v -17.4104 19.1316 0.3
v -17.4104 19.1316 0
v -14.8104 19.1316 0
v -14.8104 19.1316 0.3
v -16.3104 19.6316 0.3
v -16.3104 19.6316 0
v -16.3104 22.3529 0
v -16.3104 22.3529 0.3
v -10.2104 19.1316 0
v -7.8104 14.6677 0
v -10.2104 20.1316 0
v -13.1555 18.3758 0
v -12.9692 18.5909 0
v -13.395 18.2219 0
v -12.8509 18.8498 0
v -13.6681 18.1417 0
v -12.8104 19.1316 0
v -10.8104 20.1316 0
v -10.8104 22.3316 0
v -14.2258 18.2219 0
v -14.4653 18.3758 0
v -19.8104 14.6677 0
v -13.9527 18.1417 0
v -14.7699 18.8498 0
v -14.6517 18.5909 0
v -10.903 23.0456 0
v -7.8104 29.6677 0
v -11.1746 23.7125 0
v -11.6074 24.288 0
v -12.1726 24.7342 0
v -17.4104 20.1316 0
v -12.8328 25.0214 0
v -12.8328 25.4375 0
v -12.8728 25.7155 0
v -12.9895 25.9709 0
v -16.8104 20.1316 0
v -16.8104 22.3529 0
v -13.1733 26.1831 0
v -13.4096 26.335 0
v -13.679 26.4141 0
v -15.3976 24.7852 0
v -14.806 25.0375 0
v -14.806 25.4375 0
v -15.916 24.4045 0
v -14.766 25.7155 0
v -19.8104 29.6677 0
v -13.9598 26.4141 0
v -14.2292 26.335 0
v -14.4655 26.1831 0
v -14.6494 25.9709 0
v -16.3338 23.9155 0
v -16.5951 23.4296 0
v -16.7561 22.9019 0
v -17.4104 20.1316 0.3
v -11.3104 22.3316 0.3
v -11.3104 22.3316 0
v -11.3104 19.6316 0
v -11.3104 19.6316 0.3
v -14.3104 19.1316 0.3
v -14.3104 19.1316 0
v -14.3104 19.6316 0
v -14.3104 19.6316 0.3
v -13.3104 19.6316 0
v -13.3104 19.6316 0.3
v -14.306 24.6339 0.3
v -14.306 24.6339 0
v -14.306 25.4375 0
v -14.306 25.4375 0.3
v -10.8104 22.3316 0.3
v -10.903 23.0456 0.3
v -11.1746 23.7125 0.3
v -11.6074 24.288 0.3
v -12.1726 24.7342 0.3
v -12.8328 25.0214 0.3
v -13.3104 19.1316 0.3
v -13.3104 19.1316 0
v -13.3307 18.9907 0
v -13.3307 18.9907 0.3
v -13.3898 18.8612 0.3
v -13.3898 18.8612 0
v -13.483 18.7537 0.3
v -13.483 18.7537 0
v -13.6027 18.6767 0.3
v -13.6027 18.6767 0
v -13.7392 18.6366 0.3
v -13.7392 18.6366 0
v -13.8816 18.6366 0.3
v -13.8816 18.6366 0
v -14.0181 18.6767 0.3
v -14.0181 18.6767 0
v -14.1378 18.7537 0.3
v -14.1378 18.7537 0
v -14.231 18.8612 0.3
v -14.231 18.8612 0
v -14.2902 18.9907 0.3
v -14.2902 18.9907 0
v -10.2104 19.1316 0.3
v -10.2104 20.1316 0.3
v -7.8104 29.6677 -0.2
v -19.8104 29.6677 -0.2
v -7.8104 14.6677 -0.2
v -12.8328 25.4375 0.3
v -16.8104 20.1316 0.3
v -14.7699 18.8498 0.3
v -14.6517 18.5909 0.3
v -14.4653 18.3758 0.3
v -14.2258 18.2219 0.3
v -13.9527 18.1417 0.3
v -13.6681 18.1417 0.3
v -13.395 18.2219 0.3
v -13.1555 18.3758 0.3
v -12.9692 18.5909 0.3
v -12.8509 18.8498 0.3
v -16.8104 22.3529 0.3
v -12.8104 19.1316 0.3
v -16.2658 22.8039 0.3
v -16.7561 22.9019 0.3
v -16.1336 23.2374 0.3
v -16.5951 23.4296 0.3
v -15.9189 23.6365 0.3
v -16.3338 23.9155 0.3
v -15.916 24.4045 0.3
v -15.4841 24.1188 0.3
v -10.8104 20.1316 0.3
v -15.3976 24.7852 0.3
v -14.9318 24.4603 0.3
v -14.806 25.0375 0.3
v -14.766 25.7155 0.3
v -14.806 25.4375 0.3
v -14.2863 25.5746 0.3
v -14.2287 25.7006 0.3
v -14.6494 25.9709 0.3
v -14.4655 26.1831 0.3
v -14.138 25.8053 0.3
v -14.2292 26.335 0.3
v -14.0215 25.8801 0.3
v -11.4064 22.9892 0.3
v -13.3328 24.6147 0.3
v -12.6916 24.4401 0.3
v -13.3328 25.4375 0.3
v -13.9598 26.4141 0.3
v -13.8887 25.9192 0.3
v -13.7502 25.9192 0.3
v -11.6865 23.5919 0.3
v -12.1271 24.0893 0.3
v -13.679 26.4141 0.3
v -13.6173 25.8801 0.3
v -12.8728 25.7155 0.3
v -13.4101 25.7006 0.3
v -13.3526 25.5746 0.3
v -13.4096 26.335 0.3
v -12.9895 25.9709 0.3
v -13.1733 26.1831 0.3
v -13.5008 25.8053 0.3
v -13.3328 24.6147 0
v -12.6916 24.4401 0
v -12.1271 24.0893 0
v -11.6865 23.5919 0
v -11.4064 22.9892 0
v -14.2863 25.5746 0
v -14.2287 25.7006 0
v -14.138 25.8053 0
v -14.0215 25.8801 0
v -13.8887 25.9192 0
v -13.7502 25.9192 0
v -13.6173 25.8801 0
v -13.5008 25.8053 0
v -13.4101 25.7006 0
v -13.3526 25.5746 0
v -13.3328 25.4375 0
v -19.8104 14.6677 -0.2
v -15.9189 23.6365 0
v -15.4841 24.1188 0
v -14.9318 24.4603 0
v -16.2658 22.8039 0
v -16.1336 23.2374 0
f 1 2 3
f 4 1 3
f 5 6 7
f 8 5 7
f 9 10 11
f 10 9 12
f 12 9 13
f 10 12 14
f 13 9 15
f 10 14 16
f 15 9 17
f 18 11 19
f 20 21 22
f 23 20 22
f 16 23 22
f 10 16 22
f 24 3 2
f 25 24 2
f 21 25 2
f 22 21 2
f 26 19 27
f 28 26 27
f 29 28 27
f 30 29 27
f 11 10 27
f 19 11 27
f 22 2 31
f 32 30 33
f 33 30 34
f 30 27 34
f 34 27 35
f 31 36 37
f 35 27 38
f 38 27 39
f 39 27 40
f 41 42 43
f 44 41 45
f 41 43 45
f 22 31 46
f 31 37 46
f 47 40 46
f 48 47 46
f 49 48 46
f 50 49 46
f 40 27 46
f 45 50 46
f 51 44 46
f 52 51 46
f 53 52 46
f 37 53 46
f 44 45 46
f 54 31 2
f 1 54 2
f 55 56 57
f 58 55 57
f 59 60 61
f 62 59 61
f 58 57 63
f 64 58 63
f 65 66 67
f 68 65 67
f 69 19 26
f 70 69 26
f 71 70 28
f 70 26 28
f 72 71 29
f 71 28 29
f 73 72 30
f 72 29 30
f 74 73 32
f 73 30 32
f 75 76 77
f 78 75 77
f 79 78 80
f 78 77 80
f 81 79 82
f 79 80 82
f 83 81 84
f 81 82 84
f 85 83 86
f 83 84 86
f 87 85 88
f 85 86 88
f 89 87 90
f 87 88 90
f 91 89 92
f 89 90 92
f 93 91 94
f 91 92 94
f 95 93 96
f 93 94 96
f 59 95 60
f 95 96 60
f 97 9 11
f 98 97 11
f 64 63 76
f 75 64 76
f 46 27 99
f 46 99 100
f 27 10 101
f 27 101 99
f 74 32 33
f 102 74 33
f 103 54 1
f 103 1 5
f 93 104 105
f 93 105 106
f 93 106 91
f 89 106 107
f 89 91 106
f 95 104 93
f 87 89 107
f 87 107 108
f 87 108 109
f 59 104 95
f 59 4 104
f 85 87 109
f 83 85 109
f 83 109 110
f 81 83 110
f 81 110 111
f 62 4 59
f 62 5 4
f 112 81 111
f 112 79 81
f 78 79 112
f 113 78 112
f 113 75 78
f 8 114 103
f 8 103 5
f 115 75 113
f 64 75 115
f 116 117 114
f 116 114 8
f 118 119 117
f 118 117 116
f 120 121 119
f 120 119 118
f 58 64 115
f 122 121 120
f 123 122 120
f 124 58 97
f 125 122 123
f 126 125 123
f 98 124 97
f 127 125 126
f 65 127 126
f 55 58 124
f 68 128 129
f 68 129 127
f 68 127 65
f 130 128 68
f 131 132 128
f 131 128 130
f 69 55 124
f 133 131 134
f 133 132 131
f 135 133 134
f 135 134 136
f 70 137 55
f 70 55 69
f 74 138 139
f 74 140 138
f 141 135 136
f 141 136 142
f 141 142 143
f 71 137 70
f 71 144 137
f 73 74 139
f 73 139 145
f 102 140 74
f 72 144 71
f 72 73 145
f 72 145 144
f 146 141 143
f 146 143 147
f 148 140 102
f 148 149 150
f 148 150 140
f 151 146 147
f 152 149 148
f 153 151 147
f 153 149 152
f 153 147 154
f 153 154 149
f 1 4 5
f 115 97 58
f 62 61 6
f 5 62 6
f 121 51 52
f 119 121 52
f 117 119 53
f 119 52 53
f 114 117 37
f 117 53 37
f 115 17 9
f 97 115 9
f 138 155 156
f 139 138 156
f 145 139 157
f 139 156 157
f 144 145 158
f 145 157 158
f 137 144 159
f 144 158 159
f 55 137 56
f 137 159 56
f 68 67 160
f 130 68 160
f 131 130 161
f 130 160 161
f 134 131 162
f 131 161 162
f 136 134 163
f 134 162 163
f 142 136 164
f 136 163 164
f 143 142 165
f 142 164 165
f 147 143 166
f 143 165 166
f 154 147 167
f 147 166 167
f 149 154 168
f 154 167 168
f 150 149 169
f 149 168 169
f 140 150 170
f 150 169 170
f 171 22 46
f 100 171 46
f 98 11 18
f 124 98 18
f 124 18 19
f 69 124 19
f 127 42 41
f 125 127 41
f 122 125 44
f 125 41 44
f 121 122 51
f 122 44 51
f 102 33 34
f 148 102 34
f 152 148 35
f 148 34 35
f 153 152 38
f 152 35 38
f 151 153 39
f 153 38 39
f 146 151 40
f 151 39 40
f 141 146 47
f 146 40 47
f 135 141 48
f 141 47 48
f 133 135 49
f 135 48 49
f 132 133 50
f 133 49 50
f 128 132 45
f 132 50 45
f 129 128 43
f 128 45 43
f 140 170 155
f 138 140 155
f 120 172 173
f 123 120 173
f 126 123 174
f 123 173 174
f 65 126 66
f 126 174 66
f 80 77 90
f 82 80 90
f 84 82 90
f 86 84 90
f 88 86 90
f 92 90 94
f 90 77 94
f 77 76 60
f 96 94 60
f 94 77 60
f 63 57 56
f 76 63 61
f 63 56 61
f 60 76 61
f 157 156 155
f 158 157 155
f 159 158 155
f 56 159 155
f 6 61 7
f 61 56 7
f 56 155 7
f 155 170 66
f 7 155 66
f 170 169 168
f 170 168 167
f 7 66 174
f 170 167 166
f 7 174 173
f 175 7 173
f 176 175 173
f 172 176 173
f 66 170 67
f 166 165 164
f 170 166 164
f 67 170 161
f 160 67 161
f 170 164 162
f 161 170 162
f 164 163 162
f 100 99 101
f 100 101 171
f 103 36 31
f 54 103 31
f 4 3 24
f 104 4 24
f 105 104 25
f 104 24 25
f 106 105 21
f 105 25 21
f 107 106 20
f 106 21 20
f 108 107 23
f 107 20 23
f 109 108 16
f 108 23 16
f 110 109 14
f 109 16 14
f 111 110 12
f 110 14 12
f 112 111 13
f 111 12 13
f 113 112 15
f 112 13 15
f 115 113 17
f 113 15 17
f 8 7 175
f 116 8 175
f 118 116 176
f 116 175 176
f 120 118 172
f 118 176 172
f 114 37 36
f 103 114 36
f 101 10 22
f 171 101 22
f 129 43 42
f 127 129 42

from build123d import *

# Parameters (mm, degrees)
EXTRUSION3_DEPTH = 0.3
ESQUISSE2_W      = 12
ESQUISSE2_H      = 15
EXTRUSION4_DEPTH = 0.2


with BuildPart() as part:
    # Esquisse1 → Extrusion3 (new body)
    with BuildSketch(Plane.XY):
        with BuildLine():
            Line((-12.832841813, 25.021420219), (-12.832841813, 25.437540043))
            ThreePointArc((-12.832841813, 25.437540043), (-13.819409399, 26.424107629), (-14.805976985, 25.437540043))
            Line((-14.805976985, 25.437540043), (-14.805976985, 25.037540043))
            ThreePointArc((-14.805976985, 25.037540043), (-15.667751578, 24.60975507), (-16.333846188, 23.915512028))
            ThreePointArc((-16.333846188, 23.915512028), (-16.688617291, 23.169755053), (-16.810405862, 22.352942012))
            Line((-16.810405862, 22.352942012), (-16.810405862, 20.131551422))
            Line((-16.810405862, 20.131551422), (-17.410405862, 20.131551422))
            Line((-17.410405862, 20.131551422), (-17.410405862, 19.131551422))
            Line((-17.410405862, 19.131551422), (-14.810405862, 19.131551422))
            ThreePointArc((-14.810405862, 19.131551422), (-13.810405862, 18.131551422), (-12.810405862, 19.131551422))
            Line((-12.810405862, 19.131551422), (-10.210405862, 19.131551422))
            Line((-10.210405862, 19.131551422), (-10.210405862, 20.131551422))
            Line((-10.210405862, 20.131551422), (-10.810405862, 20.131551422))
            Line((-10.810405862, 20.131551422), (-10.810405862, 22.331551422))
            ThreePointArc((-10.810405862, 22.331551422), (-11.372418001, 24.014230931), (-12.832841813, 25.021420219))
        make_face()
        with BuildLine():
            Line((-11.310405862, 22.331551422), (-11.310405862, 19.631551422))
            Line((-11.310405862, 19.631551422), (-13.310405862, 19.631551422))
            Line((-13.310405862, 19.631551422), (-13.310405862, 19.131551422))
            ThreePointArc((-13.310405862, 19.131551422), (-13.810405862, 18.631551422), (-14.310405862, 19.131551422))
            Line((-14.310405862, 19.131551422), (-14.310405862, 19.631551422))
            Line((-14.310405862, 19.631551422), (-16.310405862, 19.631551422))
            Line((-16.310405862, 19.631551422), (-16.310405862, 22.352942012))
            ThreePointArc((-16.310405862, 22.352942012), (-16.21036525, 23.023895582), (-15.91894613, 23.636481668))
            ThreePointArc((-15.91894613, 23.636481668), (-15.220043493, 24.309156929), (-14.305976985, 24.633871146))
            Line((-14.305976985, 24.633871146), (-14.305976985, 25.437540043))
            ThreePointArc((-14.305976985, 25.437540043), (-13.819409399, 25.924107629), (-13.332841813, 25.437540043))
            Line((-13.332841813, 25.437540043), (-13.332841813, 24.614741777))
            ThreePointArc((-13.332841813, 24.614741777), (-11.888721032, 23.856609238), (-11.310405862, 22.331551422))
        make_face(mode=Mode.SUBTRACT)
    extrude(amount=EXTRUSION3_DEPTH)

    # Esquisse2 → Extrusion4 (add)
    with BuildSketch(Plane(origin=(0, 0, 0), x_dir=(-1, 0, 0), z_dir=(0, 0, -1))):
        with Locations((13.810405862, 22.167730135)):
            Rectangle(ESQUISSE2_W, ESQUISSE2_H)
    extrude(amount=EXTRUSION4_DEPTH)


solid = part.part
